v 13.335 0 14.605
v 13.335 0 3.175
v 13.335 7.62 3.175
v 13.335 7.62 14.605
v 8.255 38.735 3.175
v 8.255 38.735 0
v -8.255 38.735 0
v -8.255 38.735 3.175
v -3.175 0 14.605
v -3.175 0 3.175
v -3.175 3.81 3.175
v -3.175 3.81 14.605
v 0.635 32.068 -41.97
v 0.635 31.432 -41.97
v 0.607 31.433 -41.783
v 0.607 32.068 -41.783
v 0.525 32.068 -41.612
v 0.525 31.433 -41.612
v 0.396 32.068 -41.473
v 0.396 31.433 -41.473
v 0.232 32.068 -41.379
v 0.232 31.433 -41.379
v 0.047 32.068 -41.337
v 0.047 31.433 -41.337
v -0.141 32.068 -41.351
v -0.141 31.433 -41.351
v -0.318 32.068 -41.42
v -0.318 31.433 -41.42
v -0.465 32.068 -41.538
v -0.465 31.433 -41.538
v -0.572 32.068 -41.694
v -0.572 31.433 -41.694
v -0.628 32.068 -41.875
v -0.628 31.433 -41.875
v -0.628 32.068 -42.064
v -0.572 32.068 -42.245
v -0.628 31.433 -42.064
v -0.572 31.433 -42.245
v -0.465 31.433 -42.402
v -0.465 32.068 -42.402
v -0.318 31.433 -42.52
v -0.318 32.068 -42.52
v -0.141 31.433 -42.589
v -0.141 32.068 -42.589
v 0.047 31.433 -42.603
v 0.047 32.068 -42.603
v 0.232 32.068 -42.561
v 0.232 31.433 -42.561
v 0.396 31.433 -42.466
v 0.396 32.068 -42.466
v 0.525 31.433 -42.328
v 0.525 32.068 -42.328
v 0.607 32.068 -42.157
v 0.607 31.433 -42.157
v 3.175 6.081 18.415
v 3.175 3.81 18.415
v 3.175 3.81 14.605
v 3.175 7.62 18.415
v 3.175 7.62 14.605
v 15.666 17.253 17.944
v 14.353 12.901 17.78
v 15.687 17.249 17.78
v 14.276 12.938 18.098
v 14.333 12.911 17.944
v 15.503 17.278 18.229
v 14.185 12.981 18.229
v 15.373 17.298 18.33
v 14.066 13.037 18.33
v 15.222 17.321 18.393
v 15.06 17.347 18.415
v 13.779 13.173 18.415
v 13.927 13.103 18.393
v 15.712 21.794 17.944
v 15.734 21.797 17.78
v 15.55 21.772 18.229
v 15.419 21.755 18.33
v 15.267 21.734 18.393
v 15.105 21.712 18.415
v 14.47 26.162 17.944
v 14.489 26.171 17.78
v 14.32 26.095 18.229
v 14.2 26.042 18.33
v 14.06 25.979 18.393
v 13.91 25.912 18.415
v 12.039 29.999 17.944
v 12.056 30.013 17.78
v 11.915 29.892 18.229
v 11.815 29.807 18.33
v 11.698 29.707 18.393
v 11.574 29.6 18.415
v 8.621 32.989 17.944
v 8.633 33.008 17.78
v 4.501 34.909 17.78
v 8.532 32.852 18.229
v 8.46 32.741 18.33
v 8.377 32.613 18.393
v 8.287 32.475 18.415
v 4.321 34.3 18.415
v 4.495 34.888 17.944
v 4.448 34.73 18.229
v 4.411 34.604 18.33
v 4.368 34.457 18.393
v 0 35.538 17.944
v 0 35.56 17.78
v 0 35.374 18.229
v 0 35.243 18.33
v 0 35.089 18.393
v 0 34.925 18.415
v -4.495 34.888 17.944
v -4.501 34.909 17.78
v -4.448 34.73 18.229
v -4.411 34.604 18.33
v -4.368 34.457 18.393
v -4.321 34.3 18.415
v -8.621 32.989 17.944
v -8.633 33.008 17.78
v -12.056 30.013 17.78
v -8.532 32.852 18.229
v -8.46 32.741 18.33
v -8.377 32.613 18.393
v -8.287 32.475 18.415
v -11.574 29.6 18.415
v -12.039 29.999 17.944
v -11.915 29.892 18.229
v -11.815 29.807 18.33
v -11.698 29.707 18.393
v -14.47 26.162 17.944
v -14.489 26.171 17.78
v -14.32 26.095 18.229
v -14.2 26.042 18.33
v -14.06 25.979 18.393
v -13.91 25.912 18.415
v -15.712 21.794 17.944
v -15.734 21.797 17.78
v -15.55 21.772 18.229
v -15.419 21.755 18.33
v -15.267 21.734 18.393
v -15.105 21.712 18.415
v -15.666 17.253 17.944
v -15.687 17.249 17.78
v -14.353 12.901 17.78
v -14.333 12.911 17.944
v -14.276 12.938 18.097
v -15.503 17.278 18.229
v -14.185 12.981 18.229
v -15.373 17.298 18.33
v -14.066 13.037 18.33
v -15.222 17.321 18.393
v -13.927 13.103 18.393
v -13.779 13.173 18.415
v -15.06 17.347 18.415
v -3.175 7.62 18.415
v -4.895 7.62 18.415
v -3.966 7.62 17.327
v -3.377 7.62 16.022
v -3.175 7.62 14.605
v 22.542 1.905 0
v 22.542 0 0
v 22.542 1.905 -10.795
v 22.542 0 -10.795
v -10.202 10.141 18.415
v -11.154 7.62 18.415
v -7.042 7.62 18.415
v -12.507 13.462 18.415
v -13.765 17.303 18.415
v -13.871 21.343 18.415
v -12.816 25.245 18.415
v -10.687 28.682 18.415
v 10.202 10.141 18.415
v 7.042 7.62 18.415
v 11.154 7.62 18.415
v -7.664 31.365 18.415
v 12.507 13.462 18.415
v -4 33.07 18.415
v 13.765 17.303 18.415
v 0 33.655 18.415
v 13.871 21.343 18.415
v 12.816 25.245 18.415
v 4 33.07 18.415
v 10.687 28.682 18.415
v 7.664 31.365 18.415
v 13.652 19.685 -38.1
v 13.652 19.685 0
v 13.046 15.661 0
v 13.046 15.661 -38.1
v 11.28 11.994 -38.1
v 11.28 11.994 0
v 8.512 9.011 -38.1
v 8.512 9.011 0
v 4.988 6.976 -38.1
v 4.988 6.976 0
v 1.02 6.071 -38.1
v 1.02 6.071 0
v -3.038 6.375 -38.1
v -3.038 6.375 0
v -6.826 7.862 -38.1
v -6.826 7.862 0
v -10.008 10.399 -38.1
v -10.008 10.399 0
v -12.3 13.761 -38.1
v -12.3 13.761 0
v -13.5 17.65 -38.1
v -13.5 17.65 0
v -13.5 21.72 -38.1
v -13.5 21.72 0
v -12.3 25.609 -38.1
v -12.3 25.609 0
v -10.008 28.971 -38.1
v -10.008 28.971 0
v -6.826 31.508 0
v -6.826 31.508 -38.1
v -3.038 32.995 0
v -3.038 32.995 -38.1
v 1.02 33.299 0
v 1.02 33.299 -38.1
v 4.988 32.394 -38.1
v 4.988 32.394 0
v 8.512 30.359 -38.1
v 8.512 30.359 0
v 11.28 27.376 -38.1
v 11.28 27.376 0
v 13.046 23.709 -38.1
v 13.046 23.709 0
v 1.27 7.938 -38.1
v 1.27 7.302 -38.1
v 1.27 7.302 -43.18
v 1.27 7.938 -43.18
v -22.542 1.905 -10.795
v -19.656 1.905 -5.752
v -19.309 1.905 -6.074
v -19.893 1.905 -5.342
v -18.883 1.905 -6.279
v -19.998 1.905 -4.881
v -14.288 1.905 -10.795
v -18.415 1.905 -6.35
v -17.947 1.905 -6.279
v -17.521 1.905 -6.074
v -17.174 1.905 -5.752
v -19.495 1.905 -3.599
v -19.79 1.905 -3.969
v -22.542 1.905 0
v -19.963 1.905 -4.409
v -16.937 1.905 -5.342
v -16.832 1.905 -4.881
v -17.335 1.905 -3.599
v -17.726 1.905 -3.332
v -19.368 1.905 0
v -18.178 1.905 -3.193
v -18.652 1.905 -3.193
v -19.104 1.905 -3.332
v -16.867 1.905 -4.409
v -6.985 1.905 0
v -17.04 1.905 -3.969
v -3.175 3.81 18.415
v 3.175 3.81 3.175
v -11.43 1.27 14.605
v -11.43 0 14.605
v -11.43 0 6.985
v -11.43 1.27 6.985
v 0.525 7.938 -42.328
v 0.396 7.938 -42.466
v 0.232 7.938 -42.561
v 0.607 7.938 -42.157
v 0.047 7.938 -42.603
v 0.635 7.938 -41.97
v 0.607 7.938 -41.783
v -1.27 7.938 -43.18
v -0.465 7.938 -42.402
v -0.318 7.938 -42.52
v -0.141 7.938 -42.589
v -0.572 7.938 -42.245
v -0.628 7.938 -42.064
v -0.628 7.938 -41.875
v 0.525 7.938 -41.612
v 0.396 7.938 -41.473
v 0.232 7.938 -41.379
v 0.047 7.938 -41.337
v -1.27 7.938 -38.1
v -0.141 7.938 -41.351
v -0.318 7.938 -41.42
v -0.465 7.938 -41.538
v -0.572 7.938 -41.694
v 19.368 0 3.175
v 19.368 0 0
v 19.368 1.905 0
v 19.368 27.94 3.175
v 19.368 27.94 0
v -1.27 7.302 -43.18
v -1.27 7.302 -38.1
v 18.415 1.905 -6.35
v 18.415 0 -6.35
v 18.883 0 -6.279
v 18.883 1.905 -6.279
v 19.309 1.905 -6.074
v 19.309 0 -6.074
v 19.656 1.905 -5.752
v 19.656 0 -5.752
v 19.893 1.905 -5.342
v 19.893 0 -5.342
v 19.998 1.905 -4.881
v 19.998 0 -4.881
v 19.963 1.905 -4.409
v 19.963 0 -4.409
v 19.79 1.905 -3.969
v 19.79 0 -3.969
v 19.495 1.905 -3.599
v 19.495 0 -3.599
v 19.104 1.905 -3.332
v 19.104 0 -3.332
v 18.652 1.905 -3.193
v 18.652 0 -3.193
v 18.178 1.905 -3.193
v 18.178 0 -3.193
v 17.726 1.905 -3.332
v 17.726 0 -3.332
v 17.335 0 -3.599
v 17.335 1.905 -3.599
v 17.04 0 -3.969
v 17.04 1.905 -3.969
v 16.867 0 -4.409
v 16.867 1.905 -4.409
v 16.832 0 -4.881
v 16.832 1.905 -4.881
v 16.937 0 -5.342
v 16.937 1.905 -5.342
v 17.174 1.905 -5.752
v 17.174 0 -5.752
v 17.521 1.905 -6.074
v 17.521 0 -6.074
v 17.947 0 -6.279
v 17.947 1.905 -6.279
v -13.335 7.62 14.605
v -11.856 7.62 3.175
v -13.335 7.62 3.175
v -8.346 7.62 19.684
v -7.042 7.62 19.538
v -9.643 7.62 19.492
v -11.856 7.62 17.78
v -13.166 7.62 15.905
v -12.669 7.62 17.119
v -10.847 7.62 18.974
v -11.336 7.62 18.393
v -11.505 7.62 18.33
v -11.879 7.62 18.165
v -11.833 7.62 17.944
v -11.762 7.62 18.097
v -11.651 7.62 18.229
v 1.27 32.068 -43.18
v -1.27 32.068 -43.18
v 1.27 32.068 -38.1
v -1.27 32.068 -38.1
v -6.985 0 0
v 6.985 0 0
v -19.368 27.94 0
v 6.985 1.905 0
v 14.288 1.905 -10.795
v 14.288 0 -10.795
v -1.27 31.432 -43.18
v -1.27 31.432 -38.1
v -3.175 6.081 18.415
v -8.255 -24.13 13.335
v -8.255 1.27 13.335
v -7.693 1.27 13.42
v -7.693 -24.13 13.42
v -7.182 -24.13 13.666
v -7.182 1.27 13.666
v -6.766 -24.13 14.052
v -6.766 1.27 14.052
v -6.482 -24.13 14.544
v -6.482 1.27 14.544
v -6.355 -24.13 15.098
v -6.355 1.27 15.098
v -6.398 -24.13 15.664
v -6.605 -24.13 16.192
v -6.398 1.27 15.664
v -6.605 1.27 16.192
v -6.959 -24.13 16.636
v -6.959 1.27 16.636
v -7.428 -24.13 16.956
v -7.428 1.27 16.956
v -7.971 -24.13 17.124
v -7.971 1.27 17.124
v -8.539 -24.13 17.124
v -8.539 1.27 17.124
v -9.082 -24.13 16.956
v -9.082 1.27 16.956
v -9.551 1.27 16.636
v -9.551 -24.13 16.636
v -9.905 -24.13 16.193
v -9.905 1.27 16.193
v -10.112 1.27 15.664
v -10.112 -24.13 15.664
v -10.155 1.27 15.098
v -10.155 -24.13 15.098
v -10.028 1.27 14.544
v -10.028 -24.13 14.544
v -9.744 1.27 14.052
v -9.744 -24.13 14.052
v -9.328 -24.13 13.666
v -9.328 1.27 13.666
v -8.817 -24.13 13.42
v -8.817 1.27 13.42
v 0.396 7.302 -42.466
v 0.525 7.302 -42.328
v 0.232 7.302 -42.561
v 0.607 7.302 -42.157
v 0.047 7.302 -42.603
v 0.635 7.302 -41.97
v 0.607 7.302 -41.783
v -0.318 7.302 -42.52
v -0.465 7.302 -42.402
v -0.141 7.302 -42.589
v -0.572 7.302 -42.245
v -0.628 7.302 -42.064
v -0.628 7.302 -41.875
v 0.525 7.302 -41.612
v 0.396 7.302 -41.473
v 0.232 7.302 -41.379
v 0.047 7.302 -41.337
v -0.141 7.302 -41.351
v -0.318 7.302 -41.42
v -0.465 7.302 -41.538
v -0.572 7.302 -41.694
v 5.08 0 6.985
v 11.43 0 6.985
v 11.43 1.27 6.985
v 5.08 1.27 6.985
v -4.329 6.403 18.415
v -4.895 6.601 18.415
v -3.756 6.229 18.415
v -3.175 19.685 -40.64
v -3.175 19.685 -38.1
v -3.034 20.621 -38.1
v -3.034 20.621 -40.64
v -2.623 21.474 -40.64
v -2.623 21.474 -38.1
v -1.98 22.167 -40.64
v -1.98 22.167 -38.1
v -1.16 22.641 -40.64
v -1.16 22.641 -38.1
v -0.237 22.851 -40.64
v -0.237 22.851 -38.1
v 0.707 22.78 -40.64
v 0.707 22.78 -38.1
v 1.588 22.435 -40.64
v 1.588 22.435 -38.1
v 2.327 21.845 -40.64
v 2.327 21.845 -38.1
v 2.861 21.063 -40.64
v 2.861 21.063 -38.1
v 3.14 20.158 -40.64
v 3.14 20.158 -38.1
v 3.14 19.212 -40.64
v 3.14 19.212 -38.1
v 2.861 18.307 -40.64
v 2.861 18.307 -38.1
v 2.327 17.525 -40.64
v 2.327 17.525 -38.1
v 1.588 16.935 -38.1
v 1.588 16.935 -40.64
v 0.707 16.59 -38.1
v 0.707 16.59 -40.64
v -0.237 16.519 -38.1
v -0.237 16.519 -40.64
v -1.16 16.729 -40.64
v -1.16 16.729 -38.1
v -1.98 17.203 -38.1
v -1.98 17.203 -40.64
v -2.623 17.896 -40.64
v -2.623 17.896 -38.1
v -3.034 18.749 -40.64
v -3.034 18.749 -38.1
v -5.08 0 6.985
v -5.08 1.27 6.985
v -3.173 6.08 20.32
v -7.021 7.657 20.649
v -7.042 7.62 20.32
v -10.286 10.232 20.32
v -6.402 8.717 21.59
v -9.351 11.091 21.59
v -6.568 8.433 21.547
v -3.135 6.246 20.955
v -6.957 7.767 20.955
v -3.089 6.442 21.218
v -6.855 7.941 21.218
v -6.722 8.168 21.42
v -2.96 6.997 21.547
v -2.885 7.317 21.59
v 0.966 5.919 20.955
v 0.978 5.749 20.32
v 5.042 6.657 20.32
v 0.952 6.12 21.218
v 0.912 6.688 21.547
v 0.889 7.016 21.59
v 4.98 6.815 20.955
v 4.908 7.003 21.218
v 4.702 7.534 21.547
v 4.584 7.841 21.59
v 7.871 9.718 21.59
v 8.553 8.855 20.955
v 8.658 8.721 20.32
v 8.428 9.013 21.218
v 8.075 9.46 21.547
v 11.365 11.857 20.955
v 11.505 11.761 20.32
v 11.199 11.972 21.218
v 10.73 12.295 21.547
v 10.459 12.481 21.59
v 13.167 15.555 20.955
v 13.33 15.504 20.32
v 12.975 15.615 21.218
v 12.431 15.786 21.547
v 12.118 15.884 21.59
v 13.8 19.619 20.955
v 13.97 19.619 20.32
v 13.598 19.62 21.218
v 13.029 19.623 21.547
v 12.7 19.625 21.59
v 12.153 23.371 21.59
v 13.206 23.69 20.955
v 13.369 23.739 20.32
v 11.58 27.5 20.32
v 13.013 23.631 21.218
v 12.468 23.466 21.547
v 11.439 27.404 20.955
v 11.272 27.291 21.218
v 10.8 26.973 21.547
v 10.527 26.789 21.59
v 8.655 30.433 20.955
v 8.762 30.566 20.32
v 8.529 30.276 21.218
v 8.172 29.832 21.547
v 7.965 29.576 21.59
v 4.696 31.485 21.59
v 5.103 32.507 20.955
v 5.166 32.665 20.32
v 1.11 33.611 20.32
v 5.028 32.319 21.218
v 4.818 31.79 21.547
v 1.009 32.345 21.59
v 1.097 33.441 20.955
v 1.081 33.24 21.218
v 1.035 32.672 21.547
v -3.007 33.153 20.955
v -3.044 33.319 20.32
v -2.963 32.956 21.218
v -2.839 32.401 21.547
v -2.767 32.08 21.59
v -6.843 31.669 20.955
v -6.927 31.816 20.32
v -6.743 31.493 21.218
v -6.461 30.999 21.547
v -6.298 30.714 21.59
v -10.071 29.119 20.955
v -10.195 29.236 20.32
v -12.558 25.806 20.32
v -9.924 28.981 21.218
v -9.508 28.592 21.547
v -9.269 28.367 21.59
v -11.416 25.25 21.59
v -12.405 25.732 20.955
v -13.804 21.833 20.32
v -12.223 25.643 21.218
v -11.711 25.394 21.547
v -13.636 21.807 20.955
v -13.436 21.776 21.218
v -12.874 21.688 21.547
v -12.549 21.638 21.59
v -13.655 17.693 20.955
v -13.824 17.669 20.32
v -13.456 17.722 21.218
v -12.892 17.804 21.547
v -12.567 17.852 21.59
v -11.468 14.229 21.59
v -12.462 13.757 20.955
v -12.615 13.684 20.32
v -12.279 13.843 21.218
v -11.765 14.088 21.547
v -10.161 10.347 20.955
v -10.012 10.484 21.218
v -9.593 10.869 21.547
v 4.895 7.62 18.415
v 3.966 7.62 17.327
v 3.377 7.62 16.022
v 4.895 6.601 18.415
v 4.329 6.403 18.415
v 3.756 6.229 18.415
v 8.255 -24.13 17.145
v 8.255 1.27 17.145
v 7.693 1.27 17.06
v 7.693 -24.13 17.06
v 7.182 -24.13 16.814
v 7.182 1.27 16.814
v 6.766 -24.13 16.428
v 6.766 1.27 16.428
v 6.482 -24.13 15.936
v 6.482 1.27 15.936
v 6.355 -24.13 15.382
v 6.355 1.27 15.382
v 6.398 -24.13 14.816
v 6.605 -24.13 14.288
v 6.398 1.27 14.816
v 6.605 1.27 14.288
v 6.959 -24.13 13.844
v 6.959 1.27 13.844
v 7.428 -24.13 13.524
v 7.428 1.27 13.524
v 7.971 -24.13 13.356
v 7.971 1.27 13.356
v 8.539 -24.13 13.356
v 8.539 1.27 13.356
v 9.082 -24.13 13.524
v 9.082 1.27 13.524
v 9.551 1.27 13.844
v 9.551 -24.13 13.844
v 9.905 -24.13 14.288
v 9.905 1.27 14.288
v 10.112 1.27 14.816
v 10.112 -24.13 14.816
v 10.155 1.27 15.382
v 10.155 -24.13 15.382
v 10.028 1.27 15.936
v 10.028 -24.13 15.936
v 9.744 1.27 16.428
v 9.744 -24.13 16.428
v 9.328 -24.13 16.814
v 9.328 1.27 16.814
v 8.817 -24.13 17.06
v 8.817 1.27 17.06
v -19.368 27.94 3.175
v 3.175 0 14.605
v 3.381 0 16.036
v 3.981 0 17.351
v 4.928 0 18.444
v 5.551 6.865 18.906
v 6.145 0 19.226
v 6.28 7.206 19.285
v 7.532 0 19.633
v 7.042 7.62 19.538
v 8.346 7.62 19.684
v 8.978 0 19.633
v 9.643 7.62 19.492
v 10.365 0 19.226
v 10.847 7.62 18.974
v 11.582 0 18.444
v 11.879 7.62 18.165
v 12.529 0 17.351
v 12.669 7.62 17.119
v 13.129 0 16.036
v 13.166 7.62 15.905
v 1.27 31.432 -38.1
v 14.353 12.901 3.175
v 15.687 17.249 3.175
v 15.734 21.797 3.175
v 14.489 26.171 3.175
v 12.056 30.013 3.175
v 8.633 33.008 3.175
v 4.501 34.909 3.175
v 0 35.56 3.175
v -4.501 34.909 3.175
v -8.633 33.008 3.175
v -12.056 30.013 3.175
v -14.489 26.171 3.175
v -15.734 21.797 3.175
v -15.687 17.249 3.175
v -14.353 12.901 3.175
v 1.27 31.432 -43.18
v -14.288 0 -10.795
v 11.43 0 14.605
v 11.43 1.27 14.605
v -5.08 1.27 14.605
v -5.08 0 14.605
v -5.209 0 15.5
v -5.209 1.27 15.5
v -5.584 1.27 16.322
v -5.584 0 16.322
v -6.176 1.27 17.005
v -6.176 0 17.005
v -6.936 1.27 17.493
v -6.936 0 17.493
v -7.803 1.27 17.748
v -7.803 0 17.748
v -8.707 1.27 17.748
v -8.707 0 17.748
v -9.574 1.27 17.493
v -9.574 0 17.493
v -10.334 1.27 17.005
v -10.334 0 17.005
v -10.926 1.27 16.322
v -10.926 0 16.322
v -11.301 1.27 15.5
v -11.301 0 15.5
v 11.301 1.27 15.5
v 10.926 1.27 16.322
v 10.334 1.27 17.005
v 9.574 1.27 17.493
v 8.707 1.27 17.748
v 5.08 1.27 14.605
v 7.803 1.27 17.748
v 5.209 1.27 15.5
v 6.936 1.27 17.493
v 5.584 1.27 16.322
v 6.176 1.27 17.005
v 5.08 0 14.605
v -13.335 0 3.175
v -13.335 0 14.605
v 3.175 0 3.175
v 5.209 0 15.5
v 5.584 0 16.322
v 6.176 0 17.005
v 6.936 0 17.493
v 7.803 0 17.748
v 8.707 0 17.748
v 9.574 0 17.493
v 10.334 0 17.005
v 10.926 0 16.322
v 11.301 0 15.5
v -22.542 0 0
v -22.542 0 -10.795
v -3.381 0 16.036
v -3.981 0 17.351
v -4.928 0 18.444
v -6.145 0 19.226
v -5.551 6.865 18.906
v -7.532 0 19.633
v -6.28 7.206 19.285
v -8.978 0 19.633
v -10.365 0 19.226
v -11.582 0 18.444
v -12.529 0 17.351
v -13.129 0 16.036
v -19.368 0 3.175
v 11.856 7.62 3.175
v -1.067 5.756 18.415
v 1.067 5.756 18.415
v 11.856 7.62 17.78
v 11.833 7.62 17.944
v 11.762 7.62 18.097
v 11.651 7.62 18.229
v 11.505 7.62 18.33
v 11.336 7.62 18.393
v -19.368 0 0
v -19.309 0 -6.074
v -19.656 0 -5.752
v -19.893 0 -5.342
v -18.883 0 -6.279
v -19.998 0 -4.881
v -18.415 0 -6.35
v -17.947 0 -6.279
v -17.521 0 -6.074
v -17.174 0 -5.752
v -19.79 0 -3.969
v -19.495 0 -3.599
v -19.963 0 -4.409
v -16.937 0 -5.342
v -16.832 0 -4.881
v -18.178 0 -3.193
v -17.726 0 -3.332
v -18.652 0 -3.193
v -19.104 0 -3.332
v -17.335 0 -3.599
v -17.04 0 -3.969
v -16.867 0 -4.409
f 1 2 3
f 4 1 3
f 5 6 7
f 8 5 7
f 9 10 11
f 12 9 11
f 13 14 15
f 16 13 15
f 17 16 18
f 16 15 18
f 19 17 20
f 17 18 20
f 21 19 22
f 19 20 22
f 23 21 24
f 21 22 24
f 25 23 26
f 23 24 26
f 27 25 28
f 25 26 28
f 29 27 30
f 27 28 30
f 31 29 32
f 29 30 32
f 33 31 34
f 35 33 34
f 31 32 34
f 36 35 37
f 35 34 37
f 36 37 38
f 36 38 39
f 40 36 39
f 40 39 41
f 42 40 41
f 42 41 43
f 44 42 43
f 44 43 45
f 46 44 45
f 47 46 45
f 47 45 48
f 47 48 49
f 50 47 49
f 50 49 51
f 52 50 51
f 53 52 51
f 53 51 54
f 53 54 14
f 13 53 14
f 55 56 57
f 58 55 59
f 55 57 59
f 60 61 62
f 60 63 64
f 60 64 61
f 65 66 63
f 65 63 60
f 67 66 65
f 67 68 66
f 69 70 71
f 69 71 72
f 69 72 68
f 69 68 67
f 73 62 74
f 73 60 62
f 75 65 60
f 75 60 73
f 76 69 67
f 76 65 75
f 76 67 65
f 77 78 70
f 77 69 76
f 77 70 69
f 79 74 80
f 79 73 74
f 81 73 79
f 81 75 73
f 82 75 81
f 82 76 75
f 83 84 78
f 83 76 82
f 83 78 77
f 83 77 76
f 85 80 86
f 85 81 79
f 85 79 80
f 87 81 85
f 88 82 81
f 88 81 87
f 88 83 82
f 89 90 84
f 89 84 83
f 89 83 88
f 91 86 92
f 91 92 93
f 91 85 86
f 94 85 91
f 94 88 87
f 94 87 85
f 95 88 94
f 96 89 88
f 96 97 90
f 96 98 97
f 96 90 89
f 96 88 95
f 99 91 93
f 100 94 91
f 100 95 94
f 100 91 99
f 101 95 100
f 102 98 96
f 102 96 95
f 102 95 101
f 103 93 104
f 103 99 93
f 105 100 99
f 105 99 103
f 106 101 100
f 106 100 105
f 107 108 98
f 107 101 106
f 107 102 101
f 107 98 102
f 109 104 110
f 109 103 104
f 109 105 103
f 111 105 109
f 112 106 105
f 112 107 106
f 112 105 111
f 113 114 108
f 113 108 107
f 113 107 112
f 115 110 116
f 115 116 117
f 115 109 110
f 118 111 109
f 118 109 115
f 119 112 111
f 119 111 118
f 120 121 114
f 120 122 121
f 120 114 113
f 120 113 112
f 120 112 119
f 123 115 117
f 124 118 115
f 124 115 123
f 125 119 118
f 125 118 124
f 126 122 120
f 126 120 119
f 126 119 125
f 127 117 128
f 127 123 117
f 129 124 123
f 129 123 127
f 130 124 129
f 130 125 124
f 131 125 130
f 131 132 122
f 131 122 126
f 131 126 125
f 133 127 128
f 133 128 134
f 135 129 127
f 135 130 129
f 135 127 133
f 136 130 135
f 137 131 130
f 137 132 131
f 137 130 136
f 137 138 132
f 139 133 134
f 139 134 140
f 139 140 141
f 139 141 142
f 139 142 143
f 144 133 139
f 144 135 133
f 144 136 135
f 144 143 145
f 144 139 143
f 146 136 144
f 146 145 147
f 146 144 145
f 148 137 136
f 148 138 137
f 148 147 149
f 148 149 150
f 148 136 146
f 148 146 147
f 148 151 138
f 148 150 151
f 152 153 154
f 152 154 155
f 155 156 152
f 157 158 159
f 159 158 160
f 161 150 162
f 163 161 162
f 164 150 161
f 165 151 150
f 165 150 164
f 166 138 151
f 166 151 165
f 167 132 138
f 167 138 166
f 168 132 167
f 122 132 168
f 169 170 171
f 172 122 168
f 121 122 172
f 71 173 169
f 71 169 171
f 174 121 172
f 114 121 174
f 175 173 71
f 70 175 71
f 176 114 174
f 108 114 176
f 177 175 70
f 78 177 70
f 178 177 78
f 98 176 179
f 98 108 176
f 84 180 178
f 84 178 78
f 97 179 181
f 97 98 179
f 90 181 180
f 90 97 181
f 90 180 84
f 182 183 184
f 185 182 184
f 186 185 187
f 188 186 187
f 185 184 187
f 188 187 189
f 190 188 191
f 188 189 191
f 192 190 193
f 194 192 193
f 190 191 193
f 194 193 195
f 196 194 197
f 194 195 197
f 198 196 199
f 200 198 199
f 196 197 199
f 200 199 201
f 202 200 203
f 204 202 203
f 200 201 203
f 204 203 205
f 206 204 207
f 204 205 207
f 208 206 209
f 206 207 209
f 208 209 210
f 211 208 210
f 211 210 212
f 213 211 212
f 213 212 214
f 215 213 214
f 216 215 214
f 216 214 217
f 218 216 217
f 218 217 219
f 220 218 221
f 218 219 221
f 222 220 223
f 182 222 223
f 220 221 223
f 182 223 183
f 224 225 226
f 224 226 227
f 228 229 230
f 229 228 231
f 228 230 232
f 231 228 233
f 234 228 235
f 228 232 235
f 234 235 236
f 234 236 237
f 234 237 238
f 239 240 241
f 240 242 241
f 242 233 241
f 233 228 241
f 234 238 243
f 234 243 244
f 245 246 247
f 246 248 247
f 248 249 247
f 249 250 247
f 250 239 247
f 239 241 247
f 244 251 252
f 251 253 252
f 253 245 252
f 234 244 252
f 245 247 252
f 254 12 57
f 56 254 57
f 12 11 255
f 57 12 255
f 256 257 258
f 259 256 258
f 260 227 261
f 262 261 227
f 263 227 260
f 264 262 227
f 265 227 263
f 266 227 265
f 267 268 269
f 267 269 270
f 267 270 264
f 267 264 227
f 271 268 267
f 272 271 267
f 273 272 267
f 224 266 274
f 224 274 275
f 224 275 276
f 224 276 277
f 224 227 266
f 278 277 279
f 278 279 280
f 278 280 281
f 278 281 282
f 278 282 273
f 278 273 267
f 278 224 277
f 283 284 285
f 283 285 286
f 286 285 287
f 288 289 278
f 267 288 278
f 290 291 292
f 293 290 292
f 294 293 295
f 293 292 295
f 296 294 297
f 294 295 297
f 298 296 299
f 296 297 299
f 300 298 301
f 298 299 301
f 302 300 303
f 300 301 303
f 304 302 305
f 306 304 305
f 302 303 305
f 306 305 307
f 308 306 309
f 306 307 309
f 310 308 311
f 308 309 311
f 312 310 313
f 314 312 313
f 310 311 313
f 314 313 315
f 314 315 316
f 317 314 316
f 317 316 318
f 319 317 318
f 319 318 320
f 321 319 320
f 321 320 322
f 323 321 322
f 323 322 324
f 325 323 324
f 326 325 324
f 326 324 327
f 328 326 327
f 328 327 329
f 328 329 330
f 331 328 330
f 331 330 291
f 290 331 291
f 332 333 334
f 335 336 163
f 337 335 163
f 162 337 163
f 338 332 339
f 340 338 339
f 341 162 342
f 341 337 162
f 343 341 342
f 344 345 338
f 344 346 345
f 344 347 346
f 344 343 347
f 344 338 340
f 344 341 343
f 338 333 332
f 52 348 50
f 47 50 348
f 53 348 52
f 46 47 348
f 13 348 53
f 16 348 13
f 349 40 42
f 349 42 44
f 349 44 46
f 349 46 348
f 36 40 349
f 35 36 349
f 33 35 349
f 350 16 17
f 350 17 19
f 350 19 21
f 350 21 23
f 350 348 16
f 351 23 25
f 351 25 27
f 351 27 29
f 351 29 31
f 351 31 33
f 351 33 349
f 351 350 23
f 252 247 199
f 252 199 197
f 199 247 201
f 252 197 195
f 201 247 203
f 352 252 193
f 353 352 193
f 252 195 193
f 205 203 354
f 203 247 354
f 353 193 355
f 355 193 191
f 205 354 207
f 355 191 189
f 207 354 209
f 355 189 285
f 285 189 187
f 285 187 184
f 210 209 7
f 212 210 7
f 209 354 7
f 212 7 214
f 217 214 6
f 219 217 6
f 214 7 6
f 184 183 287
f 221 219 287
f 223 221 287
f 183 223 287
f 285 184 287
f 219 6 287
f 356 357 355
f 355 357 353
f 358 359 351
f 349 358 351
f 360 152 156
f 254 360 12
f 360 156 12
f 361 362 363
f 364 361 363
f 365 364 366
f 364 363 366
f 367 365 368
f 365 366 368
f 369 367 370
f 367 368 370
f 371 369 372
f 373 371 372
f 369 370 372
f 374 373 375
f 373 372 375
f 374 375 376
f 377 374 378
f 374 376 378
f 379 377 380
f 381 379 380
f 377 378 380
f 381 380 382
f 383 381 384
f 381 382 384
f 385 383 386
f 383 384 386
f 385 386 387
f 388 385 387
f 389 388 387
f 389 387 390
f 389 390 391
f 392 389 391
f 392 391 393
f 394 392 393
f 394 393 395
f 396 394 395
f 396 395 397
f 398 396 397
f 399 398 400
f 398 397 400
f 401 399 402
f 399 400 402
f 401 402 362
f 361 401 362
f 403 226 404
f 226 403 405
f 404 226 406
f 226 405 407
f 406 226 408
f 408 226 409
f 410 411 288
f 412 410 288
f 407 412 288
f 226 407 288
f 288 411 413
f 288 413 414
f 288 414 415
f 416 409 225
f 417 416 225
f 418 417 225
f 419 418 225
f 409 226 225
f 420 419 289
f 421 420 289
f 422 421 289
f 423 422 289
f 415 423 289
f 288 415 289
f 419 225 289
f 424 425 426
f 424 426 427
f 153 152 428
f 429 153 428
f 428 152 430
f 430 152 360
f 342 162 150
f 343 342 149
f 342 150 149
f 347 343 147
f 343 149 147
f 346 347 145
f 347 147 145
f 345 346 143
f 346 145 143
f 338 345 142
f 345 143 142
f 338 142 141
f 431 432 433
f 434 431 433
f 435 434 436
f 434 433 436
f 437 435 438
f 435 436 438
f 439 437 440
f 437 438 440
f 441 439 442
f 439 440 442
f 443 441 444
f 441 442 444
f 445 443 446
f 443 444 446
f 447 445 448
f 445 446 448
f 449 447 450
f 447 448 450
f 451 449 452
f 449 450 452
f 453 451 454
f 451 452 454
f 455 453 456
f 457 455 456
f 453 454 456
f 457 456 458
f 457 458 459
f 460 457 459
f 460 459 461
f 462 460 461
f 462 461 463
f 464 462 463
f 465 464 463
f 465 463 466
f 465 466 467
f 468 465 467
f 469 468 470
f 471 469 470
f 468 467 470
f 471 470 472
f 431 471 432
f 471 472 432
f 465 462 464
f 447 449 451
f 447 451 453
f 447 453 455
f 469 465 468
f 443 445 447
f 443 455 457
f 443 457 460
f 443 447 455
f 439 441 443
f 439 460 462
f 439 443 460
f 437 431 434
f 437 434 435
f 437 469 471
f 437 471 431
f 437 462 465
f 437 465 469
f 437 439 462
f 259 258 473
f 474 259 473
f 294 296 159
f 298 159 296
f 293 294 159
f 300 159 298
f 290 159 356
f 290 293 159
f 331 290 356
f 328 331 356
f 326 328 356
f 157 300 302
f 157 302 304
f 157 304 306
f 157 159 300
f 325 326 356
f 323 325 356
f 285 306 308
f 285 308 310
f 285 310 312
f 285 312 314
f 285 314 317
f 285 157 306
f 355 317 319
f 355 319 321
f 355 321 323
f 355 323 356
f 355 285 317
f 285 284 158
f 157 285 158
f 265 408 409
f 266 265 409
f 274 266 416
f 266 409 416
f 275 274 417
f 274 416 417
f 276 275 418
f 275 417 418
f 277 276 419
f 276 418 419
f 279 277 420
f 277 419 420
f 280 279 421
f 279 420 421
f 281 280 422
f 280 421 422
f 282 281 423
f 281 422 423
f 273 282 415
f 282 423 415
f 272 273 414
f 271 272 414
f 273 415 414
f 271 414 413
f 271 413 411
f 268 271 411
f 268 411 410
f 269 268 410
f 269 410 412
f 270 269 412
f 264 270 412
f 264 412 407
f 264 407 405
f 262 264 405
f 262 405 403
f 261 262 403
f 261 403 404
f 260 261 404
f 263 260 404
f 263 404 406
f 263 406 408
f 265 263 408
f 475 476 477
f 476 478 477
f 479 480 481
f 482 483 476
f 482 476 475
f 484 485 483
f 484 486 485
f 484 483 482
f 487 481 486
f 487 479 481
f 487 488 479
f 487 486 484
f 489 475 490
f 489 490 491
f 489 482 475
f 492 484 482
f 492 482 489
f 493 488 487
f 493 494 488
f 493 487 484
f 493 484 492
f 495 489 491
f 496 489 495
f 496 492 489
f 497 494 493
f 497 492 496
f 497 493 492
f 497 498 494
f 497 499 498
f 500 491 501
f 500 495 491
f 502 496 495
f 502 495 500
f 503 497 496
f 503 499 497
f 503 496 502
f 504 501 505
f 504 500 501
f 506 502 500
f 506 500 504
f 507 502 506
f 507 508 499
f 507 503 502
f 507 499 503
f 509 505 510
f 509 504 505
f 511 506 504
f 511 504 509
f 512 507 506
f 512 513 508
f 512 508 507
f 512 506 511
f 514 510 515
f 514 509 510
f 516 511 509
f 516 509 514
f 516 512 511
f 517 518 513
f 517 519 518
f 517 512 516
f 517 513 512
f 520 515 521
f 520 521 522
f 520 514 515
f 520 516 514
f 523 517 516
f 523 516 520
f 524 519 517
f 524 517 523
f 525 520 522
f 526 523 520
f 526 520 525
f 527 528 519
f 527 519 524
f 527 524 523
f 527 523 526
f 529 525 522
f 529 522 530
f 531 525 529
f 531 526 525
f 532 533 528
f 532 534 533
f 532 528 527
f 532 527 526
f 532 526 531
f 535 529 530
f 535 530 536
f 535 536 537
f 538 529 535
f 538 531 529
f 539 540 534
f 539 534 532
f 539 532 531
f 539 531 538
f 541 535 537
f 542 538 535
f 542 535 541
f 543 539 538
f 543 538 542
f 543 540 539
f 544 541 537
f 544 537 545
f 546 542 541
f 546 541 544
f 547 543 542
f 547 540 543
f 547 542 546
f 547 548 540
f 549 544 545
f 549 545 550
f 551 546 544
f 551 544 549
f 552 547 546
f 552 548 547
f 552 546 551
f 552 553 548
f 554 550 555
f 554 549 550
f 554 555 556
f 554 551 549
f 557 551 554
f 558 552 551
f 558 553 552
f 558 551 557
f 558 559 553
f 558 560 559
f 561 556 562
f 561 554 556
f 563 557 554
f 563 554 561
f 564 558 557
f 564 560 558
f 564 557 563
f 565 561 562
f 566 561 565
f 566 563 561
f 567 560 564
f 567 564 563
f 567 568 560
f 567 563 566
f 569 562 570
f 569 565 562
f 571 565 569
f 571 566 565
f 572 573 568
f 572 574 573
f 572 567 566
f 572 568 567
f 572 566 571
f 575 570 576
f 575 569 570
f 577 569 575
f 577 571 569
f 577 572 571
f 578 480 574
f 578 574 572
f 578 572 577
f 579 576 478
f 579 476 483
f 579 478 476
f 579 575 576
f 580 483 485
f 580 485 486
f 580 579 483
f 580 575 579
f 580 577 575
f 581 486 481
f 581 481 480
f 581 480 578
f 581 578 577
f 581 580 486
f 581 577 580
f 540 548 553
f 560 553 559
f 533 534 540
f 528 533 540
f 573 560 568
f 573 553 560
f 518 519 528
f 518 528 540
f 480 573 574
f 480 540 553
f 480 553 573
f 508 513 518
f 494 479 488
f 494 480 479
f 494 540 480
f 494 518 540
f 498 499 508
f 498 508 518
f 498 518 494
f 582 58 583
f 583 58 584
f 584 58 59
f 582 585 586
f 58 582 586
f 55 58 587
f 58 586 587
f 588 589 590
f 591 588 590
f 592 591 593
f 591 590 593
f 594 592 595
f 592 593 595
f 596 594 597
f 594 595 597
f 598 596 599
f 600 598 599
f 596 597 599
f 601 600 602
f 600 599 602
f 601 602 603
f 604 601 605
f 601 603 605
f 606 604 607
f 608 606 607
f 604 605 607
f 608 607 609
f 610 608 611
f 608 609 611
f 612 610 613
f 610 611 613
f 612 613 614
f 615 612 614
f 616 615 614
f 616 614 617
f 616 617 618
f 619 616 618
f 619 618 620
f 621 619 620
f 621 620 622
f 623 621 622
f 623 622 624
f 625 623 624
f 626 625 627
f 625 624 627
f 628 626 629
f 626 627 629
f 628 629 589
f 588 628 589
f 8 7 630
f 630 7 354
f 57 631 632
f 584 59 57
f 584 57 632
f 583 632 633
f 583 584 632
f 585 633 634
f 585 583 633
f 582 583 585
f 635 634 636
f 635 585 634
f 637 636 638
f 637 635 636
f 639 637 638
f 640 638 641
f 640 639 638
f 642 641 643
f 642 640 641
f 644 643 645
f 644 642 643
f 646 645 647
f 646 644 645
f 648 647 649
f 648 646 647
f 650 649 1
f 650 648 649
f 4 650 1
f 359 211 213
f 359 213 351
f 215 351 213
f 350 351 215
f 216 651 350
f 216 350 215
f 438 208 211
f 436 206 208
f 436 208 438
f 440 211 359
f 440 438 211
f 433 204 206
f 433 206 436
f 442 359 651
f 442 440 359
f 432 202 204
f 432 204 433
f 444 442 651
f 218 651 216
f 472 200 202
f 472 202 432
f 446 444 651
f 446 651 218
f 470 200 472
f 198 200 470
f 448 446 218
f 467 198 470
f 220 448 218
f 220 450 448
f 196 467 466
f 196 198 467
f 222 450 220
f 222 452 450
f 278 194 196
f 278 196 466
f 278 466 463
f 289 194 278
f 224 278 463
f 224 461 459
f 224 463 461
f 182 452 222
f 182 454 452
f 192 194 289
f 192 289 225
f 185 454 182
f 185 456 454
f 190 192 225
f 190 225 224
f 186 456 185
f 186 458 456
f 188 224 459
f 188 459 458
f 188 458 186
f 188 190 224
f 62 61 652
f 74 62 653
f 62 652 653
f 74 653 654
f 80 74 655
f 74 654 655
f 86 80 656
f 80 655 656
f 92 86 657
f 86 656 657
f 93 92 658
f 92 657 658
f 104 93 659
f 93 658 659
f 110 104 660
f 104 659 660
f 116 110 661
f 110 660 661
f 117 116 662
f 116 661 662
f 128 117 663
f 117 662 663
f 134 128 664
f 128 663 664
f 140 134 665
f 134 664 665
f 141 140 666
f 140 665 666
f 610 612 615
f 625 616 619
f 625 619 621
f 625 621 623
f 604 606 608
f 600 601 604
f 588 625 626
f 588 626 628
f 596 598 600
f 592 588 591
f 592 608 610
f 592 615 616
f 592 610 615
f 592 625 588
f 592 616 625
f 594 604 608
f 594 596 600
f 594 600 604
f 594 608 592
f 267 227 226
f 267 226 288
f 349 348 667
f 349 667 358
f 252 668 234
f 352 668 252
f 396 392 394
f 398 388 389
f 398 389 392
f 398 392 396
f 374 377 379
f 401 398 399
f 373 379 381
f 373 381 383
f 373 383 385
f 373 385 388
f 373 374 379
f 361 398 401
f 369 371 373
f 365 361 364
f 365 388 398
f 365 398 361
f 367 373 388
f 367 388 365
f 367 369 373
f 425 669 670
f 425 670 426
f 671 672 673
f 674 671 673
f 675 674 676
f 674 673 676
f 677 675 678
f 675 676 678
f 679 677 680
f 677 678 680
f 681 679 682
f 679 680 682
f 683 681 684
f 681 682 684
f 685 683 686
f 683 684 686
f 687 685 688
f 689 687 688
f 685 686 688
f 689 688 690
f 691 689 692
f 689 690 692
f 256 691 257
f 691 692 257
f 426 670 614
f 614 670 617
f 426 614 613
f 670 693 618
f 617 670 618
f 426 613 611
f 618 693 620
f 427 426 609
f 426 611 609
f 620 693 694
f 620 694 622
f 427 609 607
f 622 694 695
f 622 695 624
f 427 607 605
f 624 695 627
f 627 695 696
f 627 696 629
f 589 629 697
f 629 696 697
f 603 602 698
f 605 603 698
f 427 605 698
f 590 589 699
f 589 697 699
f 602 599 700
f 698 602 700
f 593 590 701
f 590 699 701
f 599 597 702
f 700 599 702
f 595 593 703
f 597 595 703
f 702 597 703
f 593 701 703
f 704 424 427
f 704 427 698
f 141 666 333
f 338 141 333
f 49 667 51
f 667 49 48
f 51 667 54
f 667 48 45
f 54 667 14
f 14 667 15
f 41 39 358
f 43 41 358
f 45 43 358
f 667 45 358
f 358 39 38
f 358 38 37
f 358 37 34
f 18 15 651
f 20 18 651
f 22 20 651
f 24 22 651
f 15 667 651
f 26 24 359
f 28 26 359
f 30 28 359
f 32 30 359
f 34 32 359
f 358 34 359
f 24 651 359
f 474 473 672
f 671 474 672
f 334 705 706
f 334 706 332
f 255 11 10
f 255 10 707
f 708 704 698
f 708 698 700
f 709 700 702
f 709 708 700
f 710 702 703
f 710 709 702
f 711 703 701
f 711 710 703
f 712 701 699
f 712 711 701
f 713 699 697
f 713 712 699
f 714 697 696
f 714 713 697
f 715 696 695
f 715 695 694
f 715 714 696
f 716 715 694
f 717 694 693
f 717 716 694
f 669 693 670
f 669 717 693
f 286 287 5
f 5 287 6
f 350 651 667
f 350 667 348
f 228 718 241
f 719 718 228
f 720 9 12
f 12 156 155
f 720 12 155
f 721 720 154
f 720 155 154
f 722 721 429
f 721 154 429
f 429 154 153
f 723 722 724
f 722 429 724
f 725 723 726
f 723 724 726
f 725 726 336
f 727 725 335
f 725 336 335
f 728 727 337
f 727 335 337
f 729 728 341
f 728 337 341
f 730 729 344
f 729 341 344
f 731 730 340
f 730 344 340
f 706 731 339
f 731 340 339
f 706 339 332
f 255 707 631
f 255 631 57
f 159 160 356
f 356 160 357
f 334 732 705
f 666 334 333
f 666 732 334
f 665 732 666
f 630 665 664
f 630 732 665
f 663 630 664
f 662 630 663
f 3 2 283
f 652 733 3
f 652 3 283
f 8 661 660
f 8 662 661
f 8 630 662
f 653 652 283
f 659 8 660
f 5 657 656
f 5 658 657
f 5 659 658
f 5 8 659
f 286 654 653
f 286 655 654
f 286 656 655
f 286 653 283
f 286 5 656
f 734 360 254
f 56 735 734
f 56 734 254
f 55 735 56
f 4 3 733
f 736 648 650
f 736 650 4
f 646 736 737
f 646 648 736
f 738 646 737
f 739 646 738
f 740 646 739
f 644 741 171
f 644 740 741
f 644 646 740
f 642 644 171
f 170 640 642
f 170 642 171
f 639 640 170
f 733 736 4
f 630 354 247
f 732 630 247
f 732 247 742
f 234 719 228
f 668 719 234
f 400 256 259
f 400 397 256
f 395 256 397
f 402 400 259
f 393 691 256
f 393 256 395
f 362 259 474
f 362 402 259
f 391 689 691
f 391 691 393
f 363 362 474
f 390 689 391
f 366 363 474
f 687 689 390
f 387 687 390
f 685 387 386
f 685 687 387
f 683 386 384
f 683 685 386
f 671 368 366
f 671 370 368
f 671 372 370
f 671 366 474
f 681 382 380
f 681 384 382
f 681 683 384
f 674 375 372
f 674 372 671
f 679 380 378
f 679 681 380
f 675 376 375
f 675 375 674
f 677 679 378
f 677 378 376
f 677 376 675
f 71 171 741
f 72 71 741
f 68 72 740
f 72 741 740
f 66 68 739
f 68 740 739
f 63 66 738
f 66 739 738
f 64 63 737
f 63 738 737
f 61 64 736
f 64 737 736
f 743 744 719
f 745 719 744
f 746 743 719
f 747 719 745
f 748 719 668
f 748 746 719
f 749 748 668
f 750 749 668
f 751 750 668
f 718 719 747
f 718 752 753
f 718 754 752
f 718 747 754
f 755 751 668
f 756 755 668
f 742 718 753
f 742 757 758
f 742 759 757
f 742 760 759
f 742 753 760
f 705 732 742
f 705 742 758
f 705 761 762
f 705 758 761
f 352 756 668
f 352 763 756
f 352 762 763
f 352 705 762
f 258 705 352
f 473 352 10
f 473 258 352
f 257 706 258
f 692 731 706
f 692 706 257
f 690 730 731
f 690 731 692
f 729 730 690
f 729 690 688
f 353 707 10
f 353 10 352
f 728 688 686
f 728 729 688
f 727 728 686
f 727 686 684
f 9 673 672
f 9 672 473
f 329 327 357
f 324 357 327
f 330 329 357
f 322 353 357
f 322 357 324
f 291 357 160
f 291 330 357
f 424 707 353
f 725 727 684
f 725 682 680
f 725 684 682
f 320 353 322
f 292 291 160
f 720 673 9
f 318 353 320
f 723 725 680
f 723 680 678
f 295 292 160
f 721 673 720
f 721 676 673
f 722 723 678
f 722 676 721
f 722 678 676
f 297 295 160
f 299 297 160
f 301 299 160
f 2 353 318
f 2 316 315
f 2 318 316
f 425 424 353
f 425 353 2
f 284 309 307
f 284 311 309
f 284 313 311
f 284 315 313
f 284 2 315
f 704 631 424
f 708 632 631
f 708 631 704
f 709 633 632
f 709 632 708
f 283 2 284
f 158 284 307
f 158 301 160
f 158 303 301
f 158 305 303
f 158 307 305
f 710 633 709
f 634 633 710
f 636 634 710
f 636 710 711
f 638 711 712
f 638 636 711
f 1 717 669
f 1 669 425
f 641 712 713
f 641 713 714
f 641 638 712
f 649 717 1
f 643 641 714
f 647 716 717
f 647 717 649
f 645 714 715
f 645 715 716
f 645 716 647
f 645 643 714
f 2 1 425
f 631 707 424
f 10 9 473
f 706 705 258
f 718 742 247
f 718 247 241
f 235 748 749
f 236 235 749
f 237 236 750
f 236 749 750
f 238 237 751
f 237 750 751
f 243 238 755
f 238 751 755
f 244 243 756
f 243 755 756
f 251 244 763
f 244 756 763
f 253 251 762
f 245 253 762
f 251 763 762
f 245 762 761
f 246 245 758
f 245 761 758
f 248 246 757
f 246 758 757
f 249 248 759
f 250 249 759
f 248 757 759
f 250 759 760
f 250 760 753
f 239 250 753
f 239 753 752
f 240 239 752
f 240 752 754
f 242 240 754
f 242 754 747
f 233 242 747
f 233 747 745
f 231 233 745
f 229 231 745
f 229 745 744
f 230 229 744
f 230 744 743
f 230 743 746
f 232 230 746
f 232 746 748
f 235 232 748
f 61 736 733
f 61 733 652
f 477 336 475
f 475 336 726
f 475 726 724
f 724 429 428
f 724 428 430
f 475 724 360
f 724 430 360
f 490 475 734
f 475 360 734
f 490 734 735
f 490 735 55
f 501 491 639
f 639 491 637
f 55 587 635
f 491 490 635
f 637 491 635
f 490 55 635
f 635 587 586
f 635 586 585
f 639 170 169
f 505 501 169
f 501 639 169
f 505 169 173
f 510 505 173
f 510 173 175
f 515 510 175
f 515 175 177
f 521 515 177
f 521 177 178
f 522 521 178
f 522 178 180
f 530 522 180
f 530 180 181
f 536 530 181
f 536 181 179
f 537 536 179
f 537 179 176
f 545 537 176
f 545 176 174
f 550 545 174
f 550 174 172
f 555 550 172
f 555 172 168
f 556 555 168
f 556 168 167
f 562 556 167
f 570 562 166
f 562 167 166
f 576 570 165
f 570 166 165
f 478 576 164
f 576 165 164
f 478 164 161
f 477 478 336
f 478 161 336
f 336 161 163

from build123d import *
from build123d.topology import SkipClean

# Parameters (mm, degrees)
BOSS_EXTRUDE1_DEPTH = 3.175
SKETCH2_W           = 10.16
SKETCH2_H           = 7.62
BOSS_EXTRUDE2_DEPTH = 11.43
SKETCH3_W           = 5.08
SKETCH3_H           = 7.62
REVOLVE1_ANGLE      = 180
SKETCH4_W           = 5.08
SKETCH4_H           = 7.62
REVOLVE2_ANGLE      = 180
BOSS_EXTRUDE3_DEPTH = 15.24
SKETCH6_R           = 13.97
BOSS_EXTRUDE4_DEPTH = 3.175
FILLET1_R           = 1.27
FILLET2_R           = 0.635
BOSS_EXTRUDE5_DEPTH = 1.905
SKETCH9_R           = 1.5875
CUT_EXTRUDE1_DEPTH  = 50.746282631
CUT_EXTRUDE2_DEPTH  = 1.27
SKETCH10_R          = 1.905
BOSS_EXTRUDE6_DEPTH = 25.4
SKETCH12_R          = 13.6525
BOSS_EXTRUDE7_DEPTH = 38.1
SKETCH13_R          = 3.175
BOSS_EXTRUDE8_DEPTH = 2.54
SKETCH14_W          = 2.54
SKETCH14_H          = 0.635
BOSS_EXTRUDE9_DEPTH = 5.08
SKETCH15_R          = 0.635
CUT_EXTRUDE3_DEPTH  = 58.971361572


with BuildPart() as part:
    # Sketch1 → Boss-Extrude1 (new body)
    with BuildSketch(Plane.XY):
        Polygon((-19.3675, 27.94), (-19.3675, 0), (19.3675, 0), (19.3675, 27.94), (8.255, 38.735), (-8.255, 38.735), align=None)
    extrude(amount=BOSS_EXTRUDE1_DEPTH)

    # Sketch2 → Boss-Extrude2 (add)
    with BuildSketch(Plane.XY.offset(3.175)):
        with Locations((-8.255, 3.81)):
            Rectangle(SKETCH2_W, SKETCH2_H)
        with Locations((8.255, 3.81)):
            Rectangle(SKETCH2_W, SKETCH2_H)
    extrude(amount=BOSS_EXTRUDE2_DEPTH)

    # Sketch3 → Revolve1 (revolve)
    with SkipClean():  # the faces are left unmerged after this step: merging them gives an invalid solid
        with BuildSketch(Plane.XY.offset(14.605)):
            with Locations((-5.715, 3.81)):
                Rectangle(SKETCH3_W, SKETCH3_H)
            with Locations((-10.795, 3.81)):
                Rectangle(SKETCH3_W, SKETCH3_H)
        revolve(axis=Axis((-8.255, 7.62, 14.605), (0, -1, 0)), revolution_arc=REVOLVE1_ANGLE)
    add(part.part.scale(1), mode=Mode.REPLACE)  # the faces are merged on a copy

    # Sketch4 → Revolve2 (revolve)
    with BuildSketch(Plane.XY.offset(14.605)):
        with Locations((5.715, 3.81)):
            Rectangle(SKETCH4_W, SKETCH4_H)
    revolve(axis=Axis((8.255, 7.62, 14.605), (0, 1, 0)), revolution_arc=REVOLVE2_ANGLE)

    # Sketch5 → Boss-Extrude3 (add)
    with BuildSketch(Plane.XY.offset(3.175)):
        with BuildLine():
            ThreePointArc((14.352662754, 12.90143922), (0, 35.56), (-14.352662754, 12.90143922))
            Line((-14.352662754, 12.90143922), (-11.856473401, 7.62))
            Line((-11.856473401, 7.62), (-3.175, 7.62))
            Line((-3.175, 7.62), (-3.175, 3.81))
            Line((-3.175, 3.81), (3.175, 3.81))
            Line((3.175, 3.81), (3.175, 7.62))
            Line((3.175, 7.62), (11.856473401, 7.62))
            Line((11.856473401, 7.62), (14.352662754, 12.90143922))
        make_face()
    extrude(amount=BOSS_EXTRUDE3_DEPTH)

    # Sketch6 → Boss-Extrude4 (add)
    with BuildSketch(Plane.XY.offset(18.415)):
        with Locations(Location((0, 19.685, 0), (0, 0, 239.727358681))):
            Circle(SKETCH6_R)
    extrude(amount=BOSS_EXTRUDE4_DEPTH)

    # Fillet1
    fillet1_edges = [part.edges().sort_by_distance(p)[0] for p in [
        (7.042490682, 31.75, 21.59),
    ]]
    fillet(fillet1_edges, radius=FILLET1_R)

    # Fillet2
    # the kernel refuses this fillet: 0.635 mm, written as the material it takes off along each edge
    with BuildSketch(Plane(origin=(11.178117323, 6.184733725, 18.415), x_dir=(-0.9041047404261693, 0.4273109153051544, 0), z_dir=(0.42731091530515436, 0.9041047404261694, 0))) as fillet2_piece_1_section:
        with BuildLine():
            CenterArc((FILLET2_R, -FILLET2_R), FILLET2_R, 90, 90)
            Line((0, -FILLET2_R), (0, 0))
            Line((0, 0), (FILLET2_R, 0))
        make_face()
    fillet2_piece_1 = extrude(amount=7.429123192, mode=Mode.PRIVATE)
    fillet2_piece_1 = split(fillet2_piece_1, bisect_by=Plane(origin=(12.958569615, 7.62, 18.272124555), z_dir=(0, 1, 0)), keep=Keep.TOP, mode=Mode.PRIVATE)
    add(fillet2_piece_1, mode=Mode.SUBTRACT)
    with BuildSketch(Plane(origin=(0, 19.685, 18.415), x_dir=(0.9041047404261693, -0.42731091530515447, 0), z_dir=(-0.42731091530515447, -0.9041047404261693, 0))) as fillet2_piece_2:
        with BuildLine():
            CenterArc((15.875 - FILLET2_R, -FILLET2_R), FILLET2_R, 0, 90)
            Line((15.875, -FILLET2_R), (15.875, 0))
            Line((15.875, 0), (15.875 - FILLET2_R, 0))
        make_face()
    revolve(axis=Axis((0, 19.685, 18.415), (0, 0, 1)), revolution_arc=230.594049451, mode=Mode.SUBTRACT)
    with BuildSketch(Plane(origin=(-14.352662754, 12.90143922, 18.415), x_dir=(0.9041047404261693, 0.4273109153051546, 0), z_dir=(0.4273109153051546, -0.9041047404261694, 0))) as fillet2_piece_3_section:
        with BuildLine():
            CenterArc((FILLET2_R, -FILLET2_R), FILLET2_R, 90, 90)
            Line((0, -FILLET2_R), (0, 0))
            Line((0, 0), (FILLET2_R, 0))
        make_face()
    fillet2_piece_3 = extrude(amount=7.429123192, mode=Mode.PRIVATE)
    fillet2_piece_3 = split(fillet2_piece_3, bisect_by=Plane(origin=(-12.958569615, 7.62, 18.272124555), z_dir=(0, 1, 0)), keep=Keep.TOP, mode=Mode.PRIVATE)
    add(fillet2_piece_3, mode=Mode.SUBTRACT)

    # Sketch8 → Boss-Extrude5 (add)
    with BuildSketch(Plane.XZ):
        Polygon((-22.5425, 0), (-22.5425, -10.795), (-14.2875, -10.795), (-6.985, 0), align=None)
        Polygon((22.5425, -10.795), (14.2875, -10.795), (6.985, 0), (22.5425, 0), align=None)
    extrude(amount=-BOSS_EXTRUDE5_DEPTH)

    # Sketch9 → Cut-Extrude1 (cut, through all)
    with BuildSketch(Plane.XZ):
        with Locations(Location((18.415, -4.7625, 0), (0, 0, 270))):
            Circle(SKETCH9_R)
        with Locations(Location((-18.415, -4.7625, 0), (0, 0, 270))):
            Circle(SKETCH9_R)
    extrude(amount=-CUT_EXTRUDE1_DEPTH, mode=Mode.SUBTRACT)

    # Sketch11 → Cut-Extrude2 (cut)
    with BuildSketch(Plane.XZ):
        with BuildLine():
            Line((-11.43, 6.985), (-5.08, 6.985))
            Line((-5.08, 6.985), (-5.08, 14.605))
            ThreePointArc((-5.08, 14.605), (-8.255, 17.78), (-11.43, 14.605))
            Line((-11.43, 14.605), (-11.43, 6.985))
        make_face()
        with BuildLine():
            Line((11.43, 14.605), (11.43, 6.985))
            Line((11.43, 6.985), (5.08, 6.985))
            Line((5.08, 6.985), (5.08, 14.605))
            ThreePointArc((5.08, 14.605), (8.255, 17.78), (11.43, 14.605))
        make_face()
    extrude(amount=-CUT_EXTRUDE2_DEPTH, mode=Mode.SUBTRACT)

    # Sketch10 → Boss-Extrude6 (add)
    with BuildSketch(Plane.XZ.offset(-1.27)):
        with Locations(Location((-8.255, 15.24, 0), (0, 0, 270))):
            Circle(SKETCH10_R)
        with Locations(Location((8.255, 15.24, 0), (0, 0, 90))):
            Circle(SKETCH10_R)
    extrude(amount=BOSS_EXTRUDE6_DEPTH)

    # Sketch12 → Boss-Extrude7 (add)
    with BuildSketch(Plane(origin=(0, 0, 0), x_dir=(-1, 0, 0), z_dir=(0, 0, -1))):
        with Locations(Location((0, 19.685, 0), (0, 0, 180))):
            Circle(SKETCH12_R)
    extrude(amount=BOSS_EXTRUDE7_DEPTH)

    # Sketch13 → Boss-Extrude8 (add)
    with BuildSketch(Plane(origin=(0, 0, -38.1), x_dir=(-1, 0, 0), z_dir=(0, 0, -1))):
        with Locations((0, 19.685)):
            Circle(SKETCH13_R)
    extrude(amount=BOSS_EXTRUDE8_DEPTH)

    # Sketch14 → Boss-Extrude9 (add)
    with BuildSketch(Plane(origin=(0, 0, -38.1), x_dir=(-1, 0, 0), z_dir=(0, 0, -1))):
        with Locations((0, 31.75)):
            Rectangle(SKETCH14_W, SKETCH14_H)
        with Locations((0, 7.62)):
            Rectangle(SKETCH14_W, SKETCH14_H)
    extrude(amount=BOSS_EXTRUDE9_DEPTH)

    # Sketch15 → Cut-Extrude3 (cut, through all)
    with BuildSketch(Plane.XZ.offset(-7.3025)):
        with Locations((0, -41.96981375)):
            Circle(SKETCH15_R)
    extrude(amount=-CUT_EXTRUDE3_DEPTH, mode=Mode.SUBTRACT)


solid = part.part
